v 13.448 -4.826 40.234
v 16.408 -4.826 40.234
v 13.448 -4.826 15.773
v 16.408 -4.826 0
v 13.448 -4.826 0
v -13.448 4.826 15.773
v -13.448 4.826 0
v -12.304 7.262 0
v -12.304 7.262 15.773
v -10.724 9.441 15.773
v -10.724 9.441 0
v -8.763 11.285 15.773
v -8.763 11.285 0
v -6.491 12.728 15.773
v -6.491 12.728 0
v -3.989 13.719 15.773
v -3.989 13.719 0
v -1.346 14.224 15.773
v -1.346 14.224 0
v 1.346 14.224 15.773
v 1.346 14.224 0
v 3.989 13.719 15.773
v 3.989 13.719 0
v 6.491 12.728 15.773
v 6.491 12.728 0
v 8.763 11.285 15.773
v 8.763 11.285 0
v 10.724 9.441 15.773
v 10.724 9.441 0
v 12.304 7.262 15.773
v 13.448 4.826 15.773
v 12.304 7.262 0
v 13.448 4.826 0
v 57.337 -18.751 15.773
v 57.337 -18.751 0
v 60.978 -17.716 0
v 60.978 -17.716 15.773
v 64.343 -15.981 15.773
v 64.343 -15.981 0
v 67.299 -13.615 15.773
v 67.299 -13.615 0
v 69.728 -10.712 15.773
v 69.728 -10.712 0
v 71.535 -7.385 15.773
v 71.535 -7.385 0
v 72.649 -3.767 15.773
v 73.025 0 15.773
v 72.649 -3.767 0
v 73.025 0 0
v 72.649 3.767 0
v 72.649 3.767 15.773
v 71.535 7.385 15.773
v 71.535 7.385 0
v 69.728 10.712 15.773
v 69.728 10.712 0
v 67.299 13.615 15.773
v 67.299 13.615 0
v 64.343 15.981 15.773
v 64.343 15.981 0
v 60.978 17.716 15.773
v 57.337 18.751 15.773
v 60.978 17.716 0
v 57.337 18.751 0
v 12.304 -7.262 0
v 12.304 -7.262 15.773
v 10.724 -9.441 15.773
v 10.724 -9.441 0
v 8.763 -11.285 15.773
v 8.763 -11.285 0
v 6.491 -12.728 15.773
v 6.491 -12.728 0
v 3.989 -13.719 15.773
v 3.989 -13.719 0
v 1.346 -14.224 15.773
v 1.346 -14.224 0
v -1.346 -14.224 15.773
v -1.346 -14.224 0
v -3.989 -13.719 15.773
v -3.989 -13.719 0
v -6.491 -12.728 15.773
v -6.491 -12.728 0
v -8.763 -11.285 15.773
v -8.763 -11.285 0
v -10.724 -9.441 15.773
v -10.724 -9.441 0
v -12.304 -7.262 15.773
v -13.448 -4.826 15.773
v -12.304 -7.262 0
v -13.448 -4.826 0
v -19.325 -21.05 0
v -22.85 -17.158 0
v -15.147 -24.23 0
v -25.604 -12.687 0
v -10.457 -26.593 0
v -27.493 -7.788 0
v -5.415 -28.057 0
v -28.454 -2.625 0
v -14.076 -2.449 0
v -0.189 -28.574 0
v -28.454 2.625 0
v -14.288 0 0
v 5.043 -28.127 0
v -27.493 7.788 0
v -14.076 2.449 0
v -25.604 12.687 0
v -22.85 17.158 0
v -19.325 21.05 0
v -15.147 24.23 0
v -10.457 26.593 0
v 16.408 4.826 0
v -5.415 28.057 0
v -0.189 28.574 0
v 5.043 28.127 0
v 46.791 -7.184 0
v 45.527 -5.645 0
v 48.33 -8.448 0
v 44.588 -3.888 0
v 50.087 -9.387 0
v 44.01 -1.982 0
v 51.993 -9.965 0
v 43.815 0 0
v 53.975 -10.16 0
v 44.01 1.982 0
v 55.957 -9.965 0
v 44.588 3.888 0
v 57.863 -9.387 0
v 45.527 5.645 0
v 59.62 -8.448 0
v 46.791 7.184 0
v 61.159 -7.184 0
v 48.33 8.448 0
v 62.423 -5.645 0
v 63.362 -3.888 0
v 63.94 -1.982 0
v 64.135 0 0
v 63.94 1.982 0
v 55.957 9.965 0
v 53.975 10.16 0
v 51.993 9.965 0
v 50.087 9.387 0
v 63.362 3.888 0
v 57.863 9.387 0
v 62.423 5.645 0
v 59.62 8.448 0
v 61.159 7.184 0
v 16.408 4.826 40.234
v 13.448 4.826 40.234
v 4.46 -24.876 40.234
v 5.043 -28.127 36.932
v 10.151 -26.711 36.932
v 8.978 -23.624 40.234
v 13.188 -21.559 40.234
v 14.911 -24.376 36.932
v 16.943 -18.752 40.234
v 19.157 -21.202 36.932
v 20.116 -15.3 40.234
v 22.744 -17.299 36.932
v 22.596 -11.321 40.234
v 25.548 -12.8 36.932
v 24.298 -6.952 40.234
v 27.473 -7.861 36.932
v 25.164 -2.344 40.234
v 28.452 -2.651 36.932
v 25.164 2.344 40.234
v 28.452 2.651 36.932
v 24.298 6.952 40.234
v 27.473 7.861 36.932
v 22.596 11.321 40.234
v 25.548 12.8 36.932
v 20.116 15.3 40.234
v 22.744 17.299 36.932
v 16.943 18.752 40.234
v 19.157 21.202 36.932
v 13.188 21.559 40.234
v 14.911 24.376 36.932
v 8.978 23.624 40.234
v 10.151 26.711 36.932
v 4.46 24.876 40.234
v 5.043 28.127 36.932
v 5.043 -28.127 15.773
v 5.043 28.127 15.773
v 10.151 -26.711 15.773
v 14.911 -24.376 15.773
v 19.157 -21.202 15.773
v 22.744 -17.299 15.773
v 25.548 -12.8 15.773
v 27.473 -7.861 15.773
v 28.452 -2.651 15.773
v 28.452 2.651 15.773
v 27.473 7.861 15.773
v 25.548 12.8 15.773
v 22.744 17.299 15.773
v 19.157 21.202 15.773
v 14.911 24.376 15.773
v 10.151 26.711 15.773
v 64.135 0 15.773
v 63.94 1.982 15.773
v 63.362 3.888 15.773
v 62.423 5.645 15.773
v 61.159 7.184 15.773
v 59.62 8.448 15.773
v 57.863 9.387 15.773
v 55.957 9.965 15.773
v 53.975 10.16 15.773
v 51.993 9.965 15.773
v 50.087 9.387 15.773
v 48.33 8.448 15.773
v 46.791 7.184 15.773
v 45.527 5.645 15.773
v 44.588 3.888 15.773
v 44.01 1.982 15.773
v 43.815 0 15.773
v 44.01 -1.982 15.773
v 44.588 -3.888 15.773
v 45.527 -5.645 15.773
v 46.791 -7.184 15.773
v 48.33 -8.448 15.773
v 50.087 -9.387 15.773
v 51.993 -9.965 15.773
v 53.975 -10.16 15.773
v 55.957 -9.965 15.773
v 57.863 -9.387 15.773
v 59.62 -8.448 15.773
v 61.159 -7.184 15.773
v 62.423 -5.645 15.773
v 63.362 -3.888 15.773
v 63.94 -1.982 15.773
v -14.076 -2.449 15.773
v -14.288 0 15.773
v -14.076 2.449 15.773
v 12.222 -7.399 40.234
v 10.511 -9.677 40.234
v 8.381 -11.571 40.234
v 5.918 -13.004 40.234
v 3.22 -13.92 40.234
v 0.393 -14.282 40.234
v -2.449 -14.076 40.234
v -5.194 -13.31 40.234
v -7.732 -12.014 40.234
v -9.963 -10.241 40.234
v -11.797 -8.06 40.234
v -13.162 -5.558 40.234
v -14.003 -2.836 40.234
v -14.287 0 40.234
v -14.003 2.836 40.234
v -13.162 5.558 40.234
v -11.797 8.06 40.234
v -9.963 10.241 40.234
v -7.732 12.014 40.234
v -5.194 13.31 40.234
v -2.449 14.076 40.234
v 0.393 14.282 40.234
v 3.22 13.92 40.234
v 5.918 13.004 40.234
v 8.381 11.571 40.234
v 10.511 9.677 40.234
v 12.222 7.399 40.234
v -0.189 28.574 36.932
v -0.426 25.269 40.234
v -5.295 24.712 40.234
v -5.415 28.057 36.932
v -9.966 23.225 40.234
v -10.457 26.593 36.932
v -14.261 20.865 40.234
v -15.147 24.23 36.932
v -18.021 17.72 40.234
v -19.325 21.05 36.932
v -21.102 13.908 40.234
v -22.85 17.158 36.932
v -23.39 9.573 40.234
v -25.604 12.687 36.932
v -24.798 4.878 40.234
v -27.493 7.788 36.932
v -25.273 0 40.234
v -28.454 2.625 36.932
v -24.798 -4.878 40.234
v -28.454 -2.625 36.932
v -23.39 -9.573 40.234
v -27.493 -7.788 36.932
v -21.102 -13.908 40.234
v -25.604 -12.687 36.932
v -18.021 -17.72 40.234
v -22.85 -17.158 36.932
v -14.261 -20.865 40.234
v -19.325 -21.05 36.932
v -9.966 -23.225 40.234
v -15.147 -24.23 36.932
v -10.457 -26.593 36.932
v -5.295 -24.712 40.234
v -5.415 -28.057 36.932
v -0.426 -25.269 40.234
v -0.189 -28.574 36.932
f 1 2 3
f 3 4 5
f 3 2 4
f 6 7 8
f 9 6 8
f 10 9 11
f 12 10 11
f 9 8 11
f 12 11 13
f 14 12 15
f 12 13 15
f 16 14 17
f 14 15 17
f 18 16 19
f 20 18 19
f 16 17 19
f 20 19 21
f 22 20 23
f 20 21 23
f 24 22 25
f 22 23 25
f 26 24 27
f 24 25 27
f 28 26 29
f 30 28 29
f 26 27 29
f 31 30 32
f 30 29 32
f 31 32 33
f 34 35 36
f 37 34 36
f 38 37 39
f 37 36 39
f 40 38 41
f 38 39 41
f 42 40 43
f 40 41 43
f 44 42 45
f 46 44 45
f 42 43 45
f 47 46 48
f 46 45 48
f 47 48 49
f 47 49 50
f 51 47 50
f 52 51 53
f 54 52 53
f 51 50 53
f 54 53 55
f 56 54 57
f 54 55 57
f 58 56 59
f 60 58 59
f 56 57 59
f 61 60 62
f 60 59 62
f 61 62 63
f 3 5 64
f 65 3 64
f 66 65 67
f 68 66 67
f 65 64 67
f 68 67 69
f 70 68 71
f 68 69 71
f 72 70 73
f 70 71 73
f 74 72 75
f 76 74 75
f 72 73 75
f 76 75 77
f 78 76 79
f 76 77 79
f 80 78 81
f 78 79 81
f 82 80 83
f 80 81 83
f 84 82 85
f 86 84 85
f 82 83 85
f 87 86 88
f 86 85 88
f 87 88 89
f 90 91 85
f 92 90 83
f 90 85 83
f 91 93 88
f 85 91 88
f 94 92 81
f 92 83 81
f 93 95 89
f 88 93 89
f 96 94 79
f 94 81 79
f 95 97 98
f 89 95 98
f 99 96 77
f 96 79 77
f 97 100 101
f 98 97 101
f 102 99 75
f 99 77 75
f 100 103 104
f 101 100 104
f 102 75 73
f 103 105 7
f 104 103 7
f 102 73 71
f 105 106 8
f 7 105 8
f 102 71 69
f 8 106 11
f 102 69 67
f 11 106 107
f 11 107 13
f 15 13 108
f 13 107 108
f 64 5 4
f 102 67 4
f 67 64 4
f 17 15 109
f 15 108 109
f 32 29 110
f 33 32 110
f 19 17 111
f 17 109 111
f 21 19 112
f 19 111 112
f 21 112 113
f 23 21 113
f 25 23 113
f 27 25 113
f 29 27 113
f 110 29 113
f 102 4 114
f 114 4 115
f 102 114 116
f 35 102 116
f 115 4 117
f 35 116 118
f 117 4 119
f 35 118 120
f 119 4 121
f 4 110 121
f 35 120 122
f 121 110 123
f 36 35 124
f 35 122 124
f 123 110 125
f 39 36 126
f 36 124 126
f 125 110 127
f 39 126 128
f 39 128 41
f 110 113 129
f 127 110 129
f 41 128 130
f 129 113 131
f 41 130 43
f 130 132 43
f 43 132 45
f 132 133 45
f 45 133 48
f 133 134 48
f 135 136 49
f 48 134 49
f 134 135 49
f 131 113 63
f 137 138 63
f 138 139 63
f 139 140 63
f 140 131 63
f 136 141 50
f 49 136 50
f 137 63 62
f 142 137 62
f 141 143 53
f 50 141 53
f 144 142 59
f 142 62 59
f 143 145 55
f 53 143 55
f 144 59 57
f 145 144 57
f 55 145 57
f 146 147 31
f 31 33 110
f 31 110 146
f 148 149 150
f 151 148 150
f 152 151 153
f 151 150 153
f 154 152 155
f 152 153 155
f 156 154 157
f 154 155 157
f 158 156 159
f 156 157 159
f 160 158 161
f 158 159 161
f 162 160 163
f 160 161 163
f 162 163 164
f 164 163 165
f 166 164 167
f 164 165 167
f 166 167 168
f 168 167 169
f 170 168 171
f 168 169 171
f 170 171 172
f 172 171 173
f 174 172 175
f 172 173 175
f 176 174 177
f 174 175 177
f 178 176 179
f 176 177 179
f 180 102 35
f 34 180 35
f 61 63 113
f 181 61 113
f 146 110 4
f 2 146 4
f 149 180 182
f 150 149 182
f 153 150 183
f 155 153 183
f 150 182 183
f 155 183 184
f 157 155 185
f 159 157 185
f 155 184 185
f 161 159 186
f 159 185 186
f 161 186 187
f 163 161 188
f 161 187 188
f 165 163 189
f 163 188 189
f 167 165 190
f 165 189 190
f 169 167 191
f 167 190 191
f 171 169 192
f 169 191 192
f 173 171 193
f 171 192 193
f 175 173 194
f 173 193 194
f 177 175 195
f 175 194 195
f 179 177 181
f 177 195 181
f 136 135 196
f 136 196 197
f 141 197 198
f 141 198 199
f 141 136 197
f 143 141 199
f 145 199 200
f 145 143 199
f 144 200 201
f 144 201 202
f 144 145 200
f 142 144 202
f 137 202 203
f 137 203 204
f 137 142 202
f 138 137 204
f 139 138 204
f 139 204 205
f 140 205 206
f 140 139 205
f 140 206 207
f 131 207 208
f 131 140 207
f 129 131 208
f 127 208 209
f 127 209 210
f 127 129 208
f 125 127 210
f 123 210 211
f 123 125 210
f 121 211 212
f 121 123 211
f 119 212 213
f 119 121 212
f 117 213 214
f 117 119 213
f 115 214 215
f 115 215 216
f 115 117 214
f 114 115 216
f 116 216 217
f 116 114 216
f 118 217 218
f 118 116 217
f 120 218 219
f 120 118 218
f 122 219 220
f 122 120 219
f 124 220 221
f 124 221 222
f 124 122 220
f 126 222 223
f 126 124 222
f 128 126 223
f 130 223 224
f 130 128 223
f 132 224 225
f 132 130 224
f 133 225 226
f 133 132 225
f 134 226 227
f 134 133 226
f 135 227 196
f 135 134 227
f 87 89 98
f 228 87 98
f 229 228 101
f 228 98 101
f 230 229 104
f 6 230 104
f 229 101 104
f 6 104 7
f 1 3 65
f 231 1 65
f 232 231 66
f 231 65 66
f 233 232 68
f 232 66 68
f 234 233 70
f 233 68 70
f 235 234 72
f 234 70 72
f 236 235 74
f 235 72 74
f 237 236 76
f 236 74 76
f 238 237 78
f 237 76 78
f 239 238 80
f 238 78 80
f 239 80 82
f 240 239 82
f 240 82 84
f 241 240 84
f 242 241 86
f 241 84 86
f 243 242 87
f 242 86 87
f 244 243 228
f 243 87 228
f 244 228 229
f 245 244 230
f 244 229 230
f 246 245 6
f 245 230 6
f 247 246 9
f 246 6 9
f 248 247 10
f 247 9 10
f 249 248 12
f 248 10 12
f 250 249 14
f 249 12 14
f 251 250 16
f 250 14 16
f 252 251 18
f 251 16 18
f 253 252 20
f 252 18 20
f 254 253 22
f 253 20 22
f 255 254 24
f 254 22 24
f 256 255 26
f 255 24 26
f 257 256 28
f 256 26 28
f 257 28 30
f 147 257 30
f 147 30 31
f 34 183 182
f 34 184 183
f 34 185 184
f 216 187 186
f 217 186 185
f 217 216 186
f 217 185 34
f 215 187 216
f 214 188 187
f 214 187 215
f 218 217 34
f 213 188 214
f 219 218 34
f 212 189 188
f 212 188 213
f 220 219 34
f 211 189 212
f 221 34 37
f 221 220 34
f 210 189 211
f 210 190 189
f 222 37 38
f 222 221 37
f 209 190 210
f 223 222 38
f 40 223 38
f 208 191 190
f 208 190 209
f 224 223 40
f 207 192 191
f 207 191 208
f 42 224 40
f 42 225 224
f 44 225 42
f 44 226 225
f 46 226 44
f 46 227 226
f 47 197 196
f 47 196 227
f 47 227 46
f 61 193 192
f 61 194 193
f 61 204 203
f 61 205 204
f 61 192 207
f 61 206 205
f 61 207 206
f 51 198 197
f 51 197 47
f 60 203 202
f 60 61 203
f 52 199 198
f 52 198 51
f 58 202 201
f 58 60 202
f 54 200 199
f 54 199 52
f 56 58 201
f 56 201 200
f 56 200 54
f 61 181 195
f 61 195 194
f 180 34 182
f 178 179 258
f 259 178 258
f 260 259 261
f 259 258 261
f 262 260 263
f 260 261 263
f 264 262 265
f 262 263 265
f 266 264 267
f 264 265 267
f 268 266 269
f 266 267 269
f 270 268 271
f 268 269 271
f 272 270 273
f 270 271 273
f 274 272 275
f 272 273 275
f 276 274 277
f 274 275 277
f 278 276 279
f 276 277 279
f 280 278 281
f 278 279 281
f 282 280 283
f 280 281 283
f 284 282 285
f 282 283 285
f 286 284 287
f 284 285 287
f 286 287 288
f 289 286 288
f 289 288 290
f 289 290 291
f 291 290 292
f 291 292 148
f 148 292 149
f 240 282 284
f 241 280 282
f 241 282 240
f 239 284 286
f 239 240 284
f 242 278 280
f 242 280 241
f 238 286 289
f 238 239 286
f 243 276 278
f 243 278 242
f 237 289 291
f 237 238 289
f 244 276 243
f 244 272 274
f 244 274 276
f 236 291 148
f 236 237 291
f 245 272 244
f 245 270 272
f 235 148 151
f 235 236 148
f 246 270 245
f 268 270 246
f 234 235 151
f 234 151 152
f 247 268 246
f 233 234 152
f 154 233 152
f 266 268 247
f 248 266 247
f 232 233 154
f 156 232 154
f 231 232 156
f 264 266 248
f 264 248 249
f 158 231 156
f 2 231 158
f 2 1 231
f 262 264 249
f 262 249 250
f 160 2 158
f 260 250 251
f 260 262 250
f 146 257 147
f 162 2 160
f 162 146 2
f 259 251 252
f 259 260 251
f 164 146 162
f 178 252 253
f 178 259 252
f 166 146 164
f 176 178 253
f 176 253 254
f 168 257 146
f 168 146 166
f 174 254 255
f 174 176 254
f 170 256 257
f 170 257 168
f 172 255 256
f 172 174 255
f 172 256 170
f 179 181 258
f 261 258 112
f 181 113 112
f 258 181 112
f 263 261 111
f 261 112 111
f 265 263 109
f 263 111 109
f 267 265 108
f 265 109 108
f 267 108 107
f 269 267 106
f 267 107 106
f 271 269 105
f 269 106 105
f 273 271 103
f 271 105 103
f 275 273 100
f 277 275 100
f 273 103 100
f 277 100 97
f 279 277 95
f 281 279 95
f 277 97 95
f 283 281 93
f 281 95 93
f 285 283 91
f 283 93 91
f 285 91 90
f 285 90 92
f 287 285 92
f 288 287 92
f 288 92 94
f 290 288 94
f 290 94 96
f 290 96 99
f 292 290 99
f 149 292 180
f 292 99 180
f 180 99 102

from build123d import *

# Parameters (mm, degrees)
F0_R     = 10.16
F1_DEPTH = 15.7734
F3_DEPTH = 24.4602
F4_SIZE  = 3.302


with BuildPart() as f1:
    # F0 (on Top) → F1 (new body)
    with BuildSketch(Plane.XY):
        with BuildLine():
            ThreePointArc((5.0426470588, -28.1265414802), (21.9160245563, -18.3362616868), (28.575, 0))
            ThreePointArc((28.575, 0), (21.9160245563, 18.3362616868), (5.0426470588, 28.1265414802))
            ThreePointArc((5.0426470588, 28.1265414802), (-28.575, 0), (5.0426470588, -28.1265414802))
        make_face()
        with BuildLine():
            ThreePointArc((-13.4477648793, 4.826), (0, 14.2875), (13.4477648793, 4.826))
            Line((13.4477648793, 4.826), (16.4084, 4.826))
            Line((16.4084, 4.826), (16.4084, -4.826))
            Line((16.4084, -4.826), (13.4477648793, -4.826))
            ThreePointArc((13.4477648793, -4.826), (0, -14.2875), (-13.4477648793, -4.826))
            Line((-13.4477648793, -4.826), (-16.4084, -4.826))
            Line((-16.4084, -4.826), (-16.4084, 4.826))
            Line((-16.4084, 4.826), (-13.4477648793, 4.826))
        make_face(mode=Mode.SUBTRACT)
        with BuildLine():
            ThreePointArc((5.0426470588, 28.1265414802), (21.9160245563, 18.3362616868), (28.575, 0))
            ThreePointArc((28.575, 0), (21.9160245563, -18.3362616868), (5.0426470588, -28.1265414802))
            Line((5.0426470588, -28.1265414802), (57.3367647059, -18.7510276535))
            ThreePointArc((57.3367647059, -18.7510276535), (34.925, 0), (57.3367647059, 18.7510276535))
            Line((57.3367647059, 18.7510276535), (5.0426470588, 28.1265414802))
        make_face()
        with BuildLine():
            ThreePointArc((73.025, 0), (68.5856830375, 12.2241744579), (57.3367647059, 18.7510276535))
            ThreePointArc((57.3367647059, 18.7510276535), (34.925, 0), (57.3367647059, -18.7510276535))
            ThreePointArc((57.3367647059, -18.7510276535), (68.5856830375, -12.2241744579), (73.025, 0))
        make_face()
        with Locations((53.975, 0)):
            Circle(F0_R, mode=Mode.SUBTRACT)
        with BuildLine():
            ThreePointArc((-13.4477648793, -4.826), (-14.2875, 0), (-13.4477648793, 4.826))
            Line((-13.4477648793, 4.826), (-16.4084, 4.826))
            Line((-16.4084, 4.826), (-16.4084, -4.826))
            Line((-16.4084, -4.826), (-13.4477648793, -4.826))
        make_face()
    extrude(amount=F1_DEPTH)

    # F2 (on face) → F3 (join)
    with BuildSketch(Plane.XY.offset(15.7734)):
        with BuildLine():
            ThreePointArc((5.0426470588, -28.1265414802), (21.9160245563, -18.3362616868), (28.575, 0))
            ThreePointArc((28.575, 0), (21.9160245563, 18.3362616868), (5.0426470588, 28.1265414802))
            ThreePointArc((5.0426470588, 28.1265414802), (-28.575, 0), (5.0426470588, -28.1265414802))
        make_face()
        with BuildLine():
            ThreePointArc((13.4477648793, -4.826), (-14.2875, 0), (13.4477648793, 4.826))
            Line((13.4477648793, 4.826), (16.4084, 4.826))
            Line((16.4084, 4.826), (16.4084, -4.826))
            Line((16.4084, -4.826), (13.4477648793, -4.826))
        make_face(mode=Mode.SUBTRACT)
    extrude(amount=F3_DEPTH)

    # F4
    f4_edges = [f1.edges().sort_by_distance(p)[0] for p in [
        (-5.042647, 28.126541, 40.2336),
    ]]
    chamfer(f4_edges, length=F4_SIZE)


solid = f1.part
